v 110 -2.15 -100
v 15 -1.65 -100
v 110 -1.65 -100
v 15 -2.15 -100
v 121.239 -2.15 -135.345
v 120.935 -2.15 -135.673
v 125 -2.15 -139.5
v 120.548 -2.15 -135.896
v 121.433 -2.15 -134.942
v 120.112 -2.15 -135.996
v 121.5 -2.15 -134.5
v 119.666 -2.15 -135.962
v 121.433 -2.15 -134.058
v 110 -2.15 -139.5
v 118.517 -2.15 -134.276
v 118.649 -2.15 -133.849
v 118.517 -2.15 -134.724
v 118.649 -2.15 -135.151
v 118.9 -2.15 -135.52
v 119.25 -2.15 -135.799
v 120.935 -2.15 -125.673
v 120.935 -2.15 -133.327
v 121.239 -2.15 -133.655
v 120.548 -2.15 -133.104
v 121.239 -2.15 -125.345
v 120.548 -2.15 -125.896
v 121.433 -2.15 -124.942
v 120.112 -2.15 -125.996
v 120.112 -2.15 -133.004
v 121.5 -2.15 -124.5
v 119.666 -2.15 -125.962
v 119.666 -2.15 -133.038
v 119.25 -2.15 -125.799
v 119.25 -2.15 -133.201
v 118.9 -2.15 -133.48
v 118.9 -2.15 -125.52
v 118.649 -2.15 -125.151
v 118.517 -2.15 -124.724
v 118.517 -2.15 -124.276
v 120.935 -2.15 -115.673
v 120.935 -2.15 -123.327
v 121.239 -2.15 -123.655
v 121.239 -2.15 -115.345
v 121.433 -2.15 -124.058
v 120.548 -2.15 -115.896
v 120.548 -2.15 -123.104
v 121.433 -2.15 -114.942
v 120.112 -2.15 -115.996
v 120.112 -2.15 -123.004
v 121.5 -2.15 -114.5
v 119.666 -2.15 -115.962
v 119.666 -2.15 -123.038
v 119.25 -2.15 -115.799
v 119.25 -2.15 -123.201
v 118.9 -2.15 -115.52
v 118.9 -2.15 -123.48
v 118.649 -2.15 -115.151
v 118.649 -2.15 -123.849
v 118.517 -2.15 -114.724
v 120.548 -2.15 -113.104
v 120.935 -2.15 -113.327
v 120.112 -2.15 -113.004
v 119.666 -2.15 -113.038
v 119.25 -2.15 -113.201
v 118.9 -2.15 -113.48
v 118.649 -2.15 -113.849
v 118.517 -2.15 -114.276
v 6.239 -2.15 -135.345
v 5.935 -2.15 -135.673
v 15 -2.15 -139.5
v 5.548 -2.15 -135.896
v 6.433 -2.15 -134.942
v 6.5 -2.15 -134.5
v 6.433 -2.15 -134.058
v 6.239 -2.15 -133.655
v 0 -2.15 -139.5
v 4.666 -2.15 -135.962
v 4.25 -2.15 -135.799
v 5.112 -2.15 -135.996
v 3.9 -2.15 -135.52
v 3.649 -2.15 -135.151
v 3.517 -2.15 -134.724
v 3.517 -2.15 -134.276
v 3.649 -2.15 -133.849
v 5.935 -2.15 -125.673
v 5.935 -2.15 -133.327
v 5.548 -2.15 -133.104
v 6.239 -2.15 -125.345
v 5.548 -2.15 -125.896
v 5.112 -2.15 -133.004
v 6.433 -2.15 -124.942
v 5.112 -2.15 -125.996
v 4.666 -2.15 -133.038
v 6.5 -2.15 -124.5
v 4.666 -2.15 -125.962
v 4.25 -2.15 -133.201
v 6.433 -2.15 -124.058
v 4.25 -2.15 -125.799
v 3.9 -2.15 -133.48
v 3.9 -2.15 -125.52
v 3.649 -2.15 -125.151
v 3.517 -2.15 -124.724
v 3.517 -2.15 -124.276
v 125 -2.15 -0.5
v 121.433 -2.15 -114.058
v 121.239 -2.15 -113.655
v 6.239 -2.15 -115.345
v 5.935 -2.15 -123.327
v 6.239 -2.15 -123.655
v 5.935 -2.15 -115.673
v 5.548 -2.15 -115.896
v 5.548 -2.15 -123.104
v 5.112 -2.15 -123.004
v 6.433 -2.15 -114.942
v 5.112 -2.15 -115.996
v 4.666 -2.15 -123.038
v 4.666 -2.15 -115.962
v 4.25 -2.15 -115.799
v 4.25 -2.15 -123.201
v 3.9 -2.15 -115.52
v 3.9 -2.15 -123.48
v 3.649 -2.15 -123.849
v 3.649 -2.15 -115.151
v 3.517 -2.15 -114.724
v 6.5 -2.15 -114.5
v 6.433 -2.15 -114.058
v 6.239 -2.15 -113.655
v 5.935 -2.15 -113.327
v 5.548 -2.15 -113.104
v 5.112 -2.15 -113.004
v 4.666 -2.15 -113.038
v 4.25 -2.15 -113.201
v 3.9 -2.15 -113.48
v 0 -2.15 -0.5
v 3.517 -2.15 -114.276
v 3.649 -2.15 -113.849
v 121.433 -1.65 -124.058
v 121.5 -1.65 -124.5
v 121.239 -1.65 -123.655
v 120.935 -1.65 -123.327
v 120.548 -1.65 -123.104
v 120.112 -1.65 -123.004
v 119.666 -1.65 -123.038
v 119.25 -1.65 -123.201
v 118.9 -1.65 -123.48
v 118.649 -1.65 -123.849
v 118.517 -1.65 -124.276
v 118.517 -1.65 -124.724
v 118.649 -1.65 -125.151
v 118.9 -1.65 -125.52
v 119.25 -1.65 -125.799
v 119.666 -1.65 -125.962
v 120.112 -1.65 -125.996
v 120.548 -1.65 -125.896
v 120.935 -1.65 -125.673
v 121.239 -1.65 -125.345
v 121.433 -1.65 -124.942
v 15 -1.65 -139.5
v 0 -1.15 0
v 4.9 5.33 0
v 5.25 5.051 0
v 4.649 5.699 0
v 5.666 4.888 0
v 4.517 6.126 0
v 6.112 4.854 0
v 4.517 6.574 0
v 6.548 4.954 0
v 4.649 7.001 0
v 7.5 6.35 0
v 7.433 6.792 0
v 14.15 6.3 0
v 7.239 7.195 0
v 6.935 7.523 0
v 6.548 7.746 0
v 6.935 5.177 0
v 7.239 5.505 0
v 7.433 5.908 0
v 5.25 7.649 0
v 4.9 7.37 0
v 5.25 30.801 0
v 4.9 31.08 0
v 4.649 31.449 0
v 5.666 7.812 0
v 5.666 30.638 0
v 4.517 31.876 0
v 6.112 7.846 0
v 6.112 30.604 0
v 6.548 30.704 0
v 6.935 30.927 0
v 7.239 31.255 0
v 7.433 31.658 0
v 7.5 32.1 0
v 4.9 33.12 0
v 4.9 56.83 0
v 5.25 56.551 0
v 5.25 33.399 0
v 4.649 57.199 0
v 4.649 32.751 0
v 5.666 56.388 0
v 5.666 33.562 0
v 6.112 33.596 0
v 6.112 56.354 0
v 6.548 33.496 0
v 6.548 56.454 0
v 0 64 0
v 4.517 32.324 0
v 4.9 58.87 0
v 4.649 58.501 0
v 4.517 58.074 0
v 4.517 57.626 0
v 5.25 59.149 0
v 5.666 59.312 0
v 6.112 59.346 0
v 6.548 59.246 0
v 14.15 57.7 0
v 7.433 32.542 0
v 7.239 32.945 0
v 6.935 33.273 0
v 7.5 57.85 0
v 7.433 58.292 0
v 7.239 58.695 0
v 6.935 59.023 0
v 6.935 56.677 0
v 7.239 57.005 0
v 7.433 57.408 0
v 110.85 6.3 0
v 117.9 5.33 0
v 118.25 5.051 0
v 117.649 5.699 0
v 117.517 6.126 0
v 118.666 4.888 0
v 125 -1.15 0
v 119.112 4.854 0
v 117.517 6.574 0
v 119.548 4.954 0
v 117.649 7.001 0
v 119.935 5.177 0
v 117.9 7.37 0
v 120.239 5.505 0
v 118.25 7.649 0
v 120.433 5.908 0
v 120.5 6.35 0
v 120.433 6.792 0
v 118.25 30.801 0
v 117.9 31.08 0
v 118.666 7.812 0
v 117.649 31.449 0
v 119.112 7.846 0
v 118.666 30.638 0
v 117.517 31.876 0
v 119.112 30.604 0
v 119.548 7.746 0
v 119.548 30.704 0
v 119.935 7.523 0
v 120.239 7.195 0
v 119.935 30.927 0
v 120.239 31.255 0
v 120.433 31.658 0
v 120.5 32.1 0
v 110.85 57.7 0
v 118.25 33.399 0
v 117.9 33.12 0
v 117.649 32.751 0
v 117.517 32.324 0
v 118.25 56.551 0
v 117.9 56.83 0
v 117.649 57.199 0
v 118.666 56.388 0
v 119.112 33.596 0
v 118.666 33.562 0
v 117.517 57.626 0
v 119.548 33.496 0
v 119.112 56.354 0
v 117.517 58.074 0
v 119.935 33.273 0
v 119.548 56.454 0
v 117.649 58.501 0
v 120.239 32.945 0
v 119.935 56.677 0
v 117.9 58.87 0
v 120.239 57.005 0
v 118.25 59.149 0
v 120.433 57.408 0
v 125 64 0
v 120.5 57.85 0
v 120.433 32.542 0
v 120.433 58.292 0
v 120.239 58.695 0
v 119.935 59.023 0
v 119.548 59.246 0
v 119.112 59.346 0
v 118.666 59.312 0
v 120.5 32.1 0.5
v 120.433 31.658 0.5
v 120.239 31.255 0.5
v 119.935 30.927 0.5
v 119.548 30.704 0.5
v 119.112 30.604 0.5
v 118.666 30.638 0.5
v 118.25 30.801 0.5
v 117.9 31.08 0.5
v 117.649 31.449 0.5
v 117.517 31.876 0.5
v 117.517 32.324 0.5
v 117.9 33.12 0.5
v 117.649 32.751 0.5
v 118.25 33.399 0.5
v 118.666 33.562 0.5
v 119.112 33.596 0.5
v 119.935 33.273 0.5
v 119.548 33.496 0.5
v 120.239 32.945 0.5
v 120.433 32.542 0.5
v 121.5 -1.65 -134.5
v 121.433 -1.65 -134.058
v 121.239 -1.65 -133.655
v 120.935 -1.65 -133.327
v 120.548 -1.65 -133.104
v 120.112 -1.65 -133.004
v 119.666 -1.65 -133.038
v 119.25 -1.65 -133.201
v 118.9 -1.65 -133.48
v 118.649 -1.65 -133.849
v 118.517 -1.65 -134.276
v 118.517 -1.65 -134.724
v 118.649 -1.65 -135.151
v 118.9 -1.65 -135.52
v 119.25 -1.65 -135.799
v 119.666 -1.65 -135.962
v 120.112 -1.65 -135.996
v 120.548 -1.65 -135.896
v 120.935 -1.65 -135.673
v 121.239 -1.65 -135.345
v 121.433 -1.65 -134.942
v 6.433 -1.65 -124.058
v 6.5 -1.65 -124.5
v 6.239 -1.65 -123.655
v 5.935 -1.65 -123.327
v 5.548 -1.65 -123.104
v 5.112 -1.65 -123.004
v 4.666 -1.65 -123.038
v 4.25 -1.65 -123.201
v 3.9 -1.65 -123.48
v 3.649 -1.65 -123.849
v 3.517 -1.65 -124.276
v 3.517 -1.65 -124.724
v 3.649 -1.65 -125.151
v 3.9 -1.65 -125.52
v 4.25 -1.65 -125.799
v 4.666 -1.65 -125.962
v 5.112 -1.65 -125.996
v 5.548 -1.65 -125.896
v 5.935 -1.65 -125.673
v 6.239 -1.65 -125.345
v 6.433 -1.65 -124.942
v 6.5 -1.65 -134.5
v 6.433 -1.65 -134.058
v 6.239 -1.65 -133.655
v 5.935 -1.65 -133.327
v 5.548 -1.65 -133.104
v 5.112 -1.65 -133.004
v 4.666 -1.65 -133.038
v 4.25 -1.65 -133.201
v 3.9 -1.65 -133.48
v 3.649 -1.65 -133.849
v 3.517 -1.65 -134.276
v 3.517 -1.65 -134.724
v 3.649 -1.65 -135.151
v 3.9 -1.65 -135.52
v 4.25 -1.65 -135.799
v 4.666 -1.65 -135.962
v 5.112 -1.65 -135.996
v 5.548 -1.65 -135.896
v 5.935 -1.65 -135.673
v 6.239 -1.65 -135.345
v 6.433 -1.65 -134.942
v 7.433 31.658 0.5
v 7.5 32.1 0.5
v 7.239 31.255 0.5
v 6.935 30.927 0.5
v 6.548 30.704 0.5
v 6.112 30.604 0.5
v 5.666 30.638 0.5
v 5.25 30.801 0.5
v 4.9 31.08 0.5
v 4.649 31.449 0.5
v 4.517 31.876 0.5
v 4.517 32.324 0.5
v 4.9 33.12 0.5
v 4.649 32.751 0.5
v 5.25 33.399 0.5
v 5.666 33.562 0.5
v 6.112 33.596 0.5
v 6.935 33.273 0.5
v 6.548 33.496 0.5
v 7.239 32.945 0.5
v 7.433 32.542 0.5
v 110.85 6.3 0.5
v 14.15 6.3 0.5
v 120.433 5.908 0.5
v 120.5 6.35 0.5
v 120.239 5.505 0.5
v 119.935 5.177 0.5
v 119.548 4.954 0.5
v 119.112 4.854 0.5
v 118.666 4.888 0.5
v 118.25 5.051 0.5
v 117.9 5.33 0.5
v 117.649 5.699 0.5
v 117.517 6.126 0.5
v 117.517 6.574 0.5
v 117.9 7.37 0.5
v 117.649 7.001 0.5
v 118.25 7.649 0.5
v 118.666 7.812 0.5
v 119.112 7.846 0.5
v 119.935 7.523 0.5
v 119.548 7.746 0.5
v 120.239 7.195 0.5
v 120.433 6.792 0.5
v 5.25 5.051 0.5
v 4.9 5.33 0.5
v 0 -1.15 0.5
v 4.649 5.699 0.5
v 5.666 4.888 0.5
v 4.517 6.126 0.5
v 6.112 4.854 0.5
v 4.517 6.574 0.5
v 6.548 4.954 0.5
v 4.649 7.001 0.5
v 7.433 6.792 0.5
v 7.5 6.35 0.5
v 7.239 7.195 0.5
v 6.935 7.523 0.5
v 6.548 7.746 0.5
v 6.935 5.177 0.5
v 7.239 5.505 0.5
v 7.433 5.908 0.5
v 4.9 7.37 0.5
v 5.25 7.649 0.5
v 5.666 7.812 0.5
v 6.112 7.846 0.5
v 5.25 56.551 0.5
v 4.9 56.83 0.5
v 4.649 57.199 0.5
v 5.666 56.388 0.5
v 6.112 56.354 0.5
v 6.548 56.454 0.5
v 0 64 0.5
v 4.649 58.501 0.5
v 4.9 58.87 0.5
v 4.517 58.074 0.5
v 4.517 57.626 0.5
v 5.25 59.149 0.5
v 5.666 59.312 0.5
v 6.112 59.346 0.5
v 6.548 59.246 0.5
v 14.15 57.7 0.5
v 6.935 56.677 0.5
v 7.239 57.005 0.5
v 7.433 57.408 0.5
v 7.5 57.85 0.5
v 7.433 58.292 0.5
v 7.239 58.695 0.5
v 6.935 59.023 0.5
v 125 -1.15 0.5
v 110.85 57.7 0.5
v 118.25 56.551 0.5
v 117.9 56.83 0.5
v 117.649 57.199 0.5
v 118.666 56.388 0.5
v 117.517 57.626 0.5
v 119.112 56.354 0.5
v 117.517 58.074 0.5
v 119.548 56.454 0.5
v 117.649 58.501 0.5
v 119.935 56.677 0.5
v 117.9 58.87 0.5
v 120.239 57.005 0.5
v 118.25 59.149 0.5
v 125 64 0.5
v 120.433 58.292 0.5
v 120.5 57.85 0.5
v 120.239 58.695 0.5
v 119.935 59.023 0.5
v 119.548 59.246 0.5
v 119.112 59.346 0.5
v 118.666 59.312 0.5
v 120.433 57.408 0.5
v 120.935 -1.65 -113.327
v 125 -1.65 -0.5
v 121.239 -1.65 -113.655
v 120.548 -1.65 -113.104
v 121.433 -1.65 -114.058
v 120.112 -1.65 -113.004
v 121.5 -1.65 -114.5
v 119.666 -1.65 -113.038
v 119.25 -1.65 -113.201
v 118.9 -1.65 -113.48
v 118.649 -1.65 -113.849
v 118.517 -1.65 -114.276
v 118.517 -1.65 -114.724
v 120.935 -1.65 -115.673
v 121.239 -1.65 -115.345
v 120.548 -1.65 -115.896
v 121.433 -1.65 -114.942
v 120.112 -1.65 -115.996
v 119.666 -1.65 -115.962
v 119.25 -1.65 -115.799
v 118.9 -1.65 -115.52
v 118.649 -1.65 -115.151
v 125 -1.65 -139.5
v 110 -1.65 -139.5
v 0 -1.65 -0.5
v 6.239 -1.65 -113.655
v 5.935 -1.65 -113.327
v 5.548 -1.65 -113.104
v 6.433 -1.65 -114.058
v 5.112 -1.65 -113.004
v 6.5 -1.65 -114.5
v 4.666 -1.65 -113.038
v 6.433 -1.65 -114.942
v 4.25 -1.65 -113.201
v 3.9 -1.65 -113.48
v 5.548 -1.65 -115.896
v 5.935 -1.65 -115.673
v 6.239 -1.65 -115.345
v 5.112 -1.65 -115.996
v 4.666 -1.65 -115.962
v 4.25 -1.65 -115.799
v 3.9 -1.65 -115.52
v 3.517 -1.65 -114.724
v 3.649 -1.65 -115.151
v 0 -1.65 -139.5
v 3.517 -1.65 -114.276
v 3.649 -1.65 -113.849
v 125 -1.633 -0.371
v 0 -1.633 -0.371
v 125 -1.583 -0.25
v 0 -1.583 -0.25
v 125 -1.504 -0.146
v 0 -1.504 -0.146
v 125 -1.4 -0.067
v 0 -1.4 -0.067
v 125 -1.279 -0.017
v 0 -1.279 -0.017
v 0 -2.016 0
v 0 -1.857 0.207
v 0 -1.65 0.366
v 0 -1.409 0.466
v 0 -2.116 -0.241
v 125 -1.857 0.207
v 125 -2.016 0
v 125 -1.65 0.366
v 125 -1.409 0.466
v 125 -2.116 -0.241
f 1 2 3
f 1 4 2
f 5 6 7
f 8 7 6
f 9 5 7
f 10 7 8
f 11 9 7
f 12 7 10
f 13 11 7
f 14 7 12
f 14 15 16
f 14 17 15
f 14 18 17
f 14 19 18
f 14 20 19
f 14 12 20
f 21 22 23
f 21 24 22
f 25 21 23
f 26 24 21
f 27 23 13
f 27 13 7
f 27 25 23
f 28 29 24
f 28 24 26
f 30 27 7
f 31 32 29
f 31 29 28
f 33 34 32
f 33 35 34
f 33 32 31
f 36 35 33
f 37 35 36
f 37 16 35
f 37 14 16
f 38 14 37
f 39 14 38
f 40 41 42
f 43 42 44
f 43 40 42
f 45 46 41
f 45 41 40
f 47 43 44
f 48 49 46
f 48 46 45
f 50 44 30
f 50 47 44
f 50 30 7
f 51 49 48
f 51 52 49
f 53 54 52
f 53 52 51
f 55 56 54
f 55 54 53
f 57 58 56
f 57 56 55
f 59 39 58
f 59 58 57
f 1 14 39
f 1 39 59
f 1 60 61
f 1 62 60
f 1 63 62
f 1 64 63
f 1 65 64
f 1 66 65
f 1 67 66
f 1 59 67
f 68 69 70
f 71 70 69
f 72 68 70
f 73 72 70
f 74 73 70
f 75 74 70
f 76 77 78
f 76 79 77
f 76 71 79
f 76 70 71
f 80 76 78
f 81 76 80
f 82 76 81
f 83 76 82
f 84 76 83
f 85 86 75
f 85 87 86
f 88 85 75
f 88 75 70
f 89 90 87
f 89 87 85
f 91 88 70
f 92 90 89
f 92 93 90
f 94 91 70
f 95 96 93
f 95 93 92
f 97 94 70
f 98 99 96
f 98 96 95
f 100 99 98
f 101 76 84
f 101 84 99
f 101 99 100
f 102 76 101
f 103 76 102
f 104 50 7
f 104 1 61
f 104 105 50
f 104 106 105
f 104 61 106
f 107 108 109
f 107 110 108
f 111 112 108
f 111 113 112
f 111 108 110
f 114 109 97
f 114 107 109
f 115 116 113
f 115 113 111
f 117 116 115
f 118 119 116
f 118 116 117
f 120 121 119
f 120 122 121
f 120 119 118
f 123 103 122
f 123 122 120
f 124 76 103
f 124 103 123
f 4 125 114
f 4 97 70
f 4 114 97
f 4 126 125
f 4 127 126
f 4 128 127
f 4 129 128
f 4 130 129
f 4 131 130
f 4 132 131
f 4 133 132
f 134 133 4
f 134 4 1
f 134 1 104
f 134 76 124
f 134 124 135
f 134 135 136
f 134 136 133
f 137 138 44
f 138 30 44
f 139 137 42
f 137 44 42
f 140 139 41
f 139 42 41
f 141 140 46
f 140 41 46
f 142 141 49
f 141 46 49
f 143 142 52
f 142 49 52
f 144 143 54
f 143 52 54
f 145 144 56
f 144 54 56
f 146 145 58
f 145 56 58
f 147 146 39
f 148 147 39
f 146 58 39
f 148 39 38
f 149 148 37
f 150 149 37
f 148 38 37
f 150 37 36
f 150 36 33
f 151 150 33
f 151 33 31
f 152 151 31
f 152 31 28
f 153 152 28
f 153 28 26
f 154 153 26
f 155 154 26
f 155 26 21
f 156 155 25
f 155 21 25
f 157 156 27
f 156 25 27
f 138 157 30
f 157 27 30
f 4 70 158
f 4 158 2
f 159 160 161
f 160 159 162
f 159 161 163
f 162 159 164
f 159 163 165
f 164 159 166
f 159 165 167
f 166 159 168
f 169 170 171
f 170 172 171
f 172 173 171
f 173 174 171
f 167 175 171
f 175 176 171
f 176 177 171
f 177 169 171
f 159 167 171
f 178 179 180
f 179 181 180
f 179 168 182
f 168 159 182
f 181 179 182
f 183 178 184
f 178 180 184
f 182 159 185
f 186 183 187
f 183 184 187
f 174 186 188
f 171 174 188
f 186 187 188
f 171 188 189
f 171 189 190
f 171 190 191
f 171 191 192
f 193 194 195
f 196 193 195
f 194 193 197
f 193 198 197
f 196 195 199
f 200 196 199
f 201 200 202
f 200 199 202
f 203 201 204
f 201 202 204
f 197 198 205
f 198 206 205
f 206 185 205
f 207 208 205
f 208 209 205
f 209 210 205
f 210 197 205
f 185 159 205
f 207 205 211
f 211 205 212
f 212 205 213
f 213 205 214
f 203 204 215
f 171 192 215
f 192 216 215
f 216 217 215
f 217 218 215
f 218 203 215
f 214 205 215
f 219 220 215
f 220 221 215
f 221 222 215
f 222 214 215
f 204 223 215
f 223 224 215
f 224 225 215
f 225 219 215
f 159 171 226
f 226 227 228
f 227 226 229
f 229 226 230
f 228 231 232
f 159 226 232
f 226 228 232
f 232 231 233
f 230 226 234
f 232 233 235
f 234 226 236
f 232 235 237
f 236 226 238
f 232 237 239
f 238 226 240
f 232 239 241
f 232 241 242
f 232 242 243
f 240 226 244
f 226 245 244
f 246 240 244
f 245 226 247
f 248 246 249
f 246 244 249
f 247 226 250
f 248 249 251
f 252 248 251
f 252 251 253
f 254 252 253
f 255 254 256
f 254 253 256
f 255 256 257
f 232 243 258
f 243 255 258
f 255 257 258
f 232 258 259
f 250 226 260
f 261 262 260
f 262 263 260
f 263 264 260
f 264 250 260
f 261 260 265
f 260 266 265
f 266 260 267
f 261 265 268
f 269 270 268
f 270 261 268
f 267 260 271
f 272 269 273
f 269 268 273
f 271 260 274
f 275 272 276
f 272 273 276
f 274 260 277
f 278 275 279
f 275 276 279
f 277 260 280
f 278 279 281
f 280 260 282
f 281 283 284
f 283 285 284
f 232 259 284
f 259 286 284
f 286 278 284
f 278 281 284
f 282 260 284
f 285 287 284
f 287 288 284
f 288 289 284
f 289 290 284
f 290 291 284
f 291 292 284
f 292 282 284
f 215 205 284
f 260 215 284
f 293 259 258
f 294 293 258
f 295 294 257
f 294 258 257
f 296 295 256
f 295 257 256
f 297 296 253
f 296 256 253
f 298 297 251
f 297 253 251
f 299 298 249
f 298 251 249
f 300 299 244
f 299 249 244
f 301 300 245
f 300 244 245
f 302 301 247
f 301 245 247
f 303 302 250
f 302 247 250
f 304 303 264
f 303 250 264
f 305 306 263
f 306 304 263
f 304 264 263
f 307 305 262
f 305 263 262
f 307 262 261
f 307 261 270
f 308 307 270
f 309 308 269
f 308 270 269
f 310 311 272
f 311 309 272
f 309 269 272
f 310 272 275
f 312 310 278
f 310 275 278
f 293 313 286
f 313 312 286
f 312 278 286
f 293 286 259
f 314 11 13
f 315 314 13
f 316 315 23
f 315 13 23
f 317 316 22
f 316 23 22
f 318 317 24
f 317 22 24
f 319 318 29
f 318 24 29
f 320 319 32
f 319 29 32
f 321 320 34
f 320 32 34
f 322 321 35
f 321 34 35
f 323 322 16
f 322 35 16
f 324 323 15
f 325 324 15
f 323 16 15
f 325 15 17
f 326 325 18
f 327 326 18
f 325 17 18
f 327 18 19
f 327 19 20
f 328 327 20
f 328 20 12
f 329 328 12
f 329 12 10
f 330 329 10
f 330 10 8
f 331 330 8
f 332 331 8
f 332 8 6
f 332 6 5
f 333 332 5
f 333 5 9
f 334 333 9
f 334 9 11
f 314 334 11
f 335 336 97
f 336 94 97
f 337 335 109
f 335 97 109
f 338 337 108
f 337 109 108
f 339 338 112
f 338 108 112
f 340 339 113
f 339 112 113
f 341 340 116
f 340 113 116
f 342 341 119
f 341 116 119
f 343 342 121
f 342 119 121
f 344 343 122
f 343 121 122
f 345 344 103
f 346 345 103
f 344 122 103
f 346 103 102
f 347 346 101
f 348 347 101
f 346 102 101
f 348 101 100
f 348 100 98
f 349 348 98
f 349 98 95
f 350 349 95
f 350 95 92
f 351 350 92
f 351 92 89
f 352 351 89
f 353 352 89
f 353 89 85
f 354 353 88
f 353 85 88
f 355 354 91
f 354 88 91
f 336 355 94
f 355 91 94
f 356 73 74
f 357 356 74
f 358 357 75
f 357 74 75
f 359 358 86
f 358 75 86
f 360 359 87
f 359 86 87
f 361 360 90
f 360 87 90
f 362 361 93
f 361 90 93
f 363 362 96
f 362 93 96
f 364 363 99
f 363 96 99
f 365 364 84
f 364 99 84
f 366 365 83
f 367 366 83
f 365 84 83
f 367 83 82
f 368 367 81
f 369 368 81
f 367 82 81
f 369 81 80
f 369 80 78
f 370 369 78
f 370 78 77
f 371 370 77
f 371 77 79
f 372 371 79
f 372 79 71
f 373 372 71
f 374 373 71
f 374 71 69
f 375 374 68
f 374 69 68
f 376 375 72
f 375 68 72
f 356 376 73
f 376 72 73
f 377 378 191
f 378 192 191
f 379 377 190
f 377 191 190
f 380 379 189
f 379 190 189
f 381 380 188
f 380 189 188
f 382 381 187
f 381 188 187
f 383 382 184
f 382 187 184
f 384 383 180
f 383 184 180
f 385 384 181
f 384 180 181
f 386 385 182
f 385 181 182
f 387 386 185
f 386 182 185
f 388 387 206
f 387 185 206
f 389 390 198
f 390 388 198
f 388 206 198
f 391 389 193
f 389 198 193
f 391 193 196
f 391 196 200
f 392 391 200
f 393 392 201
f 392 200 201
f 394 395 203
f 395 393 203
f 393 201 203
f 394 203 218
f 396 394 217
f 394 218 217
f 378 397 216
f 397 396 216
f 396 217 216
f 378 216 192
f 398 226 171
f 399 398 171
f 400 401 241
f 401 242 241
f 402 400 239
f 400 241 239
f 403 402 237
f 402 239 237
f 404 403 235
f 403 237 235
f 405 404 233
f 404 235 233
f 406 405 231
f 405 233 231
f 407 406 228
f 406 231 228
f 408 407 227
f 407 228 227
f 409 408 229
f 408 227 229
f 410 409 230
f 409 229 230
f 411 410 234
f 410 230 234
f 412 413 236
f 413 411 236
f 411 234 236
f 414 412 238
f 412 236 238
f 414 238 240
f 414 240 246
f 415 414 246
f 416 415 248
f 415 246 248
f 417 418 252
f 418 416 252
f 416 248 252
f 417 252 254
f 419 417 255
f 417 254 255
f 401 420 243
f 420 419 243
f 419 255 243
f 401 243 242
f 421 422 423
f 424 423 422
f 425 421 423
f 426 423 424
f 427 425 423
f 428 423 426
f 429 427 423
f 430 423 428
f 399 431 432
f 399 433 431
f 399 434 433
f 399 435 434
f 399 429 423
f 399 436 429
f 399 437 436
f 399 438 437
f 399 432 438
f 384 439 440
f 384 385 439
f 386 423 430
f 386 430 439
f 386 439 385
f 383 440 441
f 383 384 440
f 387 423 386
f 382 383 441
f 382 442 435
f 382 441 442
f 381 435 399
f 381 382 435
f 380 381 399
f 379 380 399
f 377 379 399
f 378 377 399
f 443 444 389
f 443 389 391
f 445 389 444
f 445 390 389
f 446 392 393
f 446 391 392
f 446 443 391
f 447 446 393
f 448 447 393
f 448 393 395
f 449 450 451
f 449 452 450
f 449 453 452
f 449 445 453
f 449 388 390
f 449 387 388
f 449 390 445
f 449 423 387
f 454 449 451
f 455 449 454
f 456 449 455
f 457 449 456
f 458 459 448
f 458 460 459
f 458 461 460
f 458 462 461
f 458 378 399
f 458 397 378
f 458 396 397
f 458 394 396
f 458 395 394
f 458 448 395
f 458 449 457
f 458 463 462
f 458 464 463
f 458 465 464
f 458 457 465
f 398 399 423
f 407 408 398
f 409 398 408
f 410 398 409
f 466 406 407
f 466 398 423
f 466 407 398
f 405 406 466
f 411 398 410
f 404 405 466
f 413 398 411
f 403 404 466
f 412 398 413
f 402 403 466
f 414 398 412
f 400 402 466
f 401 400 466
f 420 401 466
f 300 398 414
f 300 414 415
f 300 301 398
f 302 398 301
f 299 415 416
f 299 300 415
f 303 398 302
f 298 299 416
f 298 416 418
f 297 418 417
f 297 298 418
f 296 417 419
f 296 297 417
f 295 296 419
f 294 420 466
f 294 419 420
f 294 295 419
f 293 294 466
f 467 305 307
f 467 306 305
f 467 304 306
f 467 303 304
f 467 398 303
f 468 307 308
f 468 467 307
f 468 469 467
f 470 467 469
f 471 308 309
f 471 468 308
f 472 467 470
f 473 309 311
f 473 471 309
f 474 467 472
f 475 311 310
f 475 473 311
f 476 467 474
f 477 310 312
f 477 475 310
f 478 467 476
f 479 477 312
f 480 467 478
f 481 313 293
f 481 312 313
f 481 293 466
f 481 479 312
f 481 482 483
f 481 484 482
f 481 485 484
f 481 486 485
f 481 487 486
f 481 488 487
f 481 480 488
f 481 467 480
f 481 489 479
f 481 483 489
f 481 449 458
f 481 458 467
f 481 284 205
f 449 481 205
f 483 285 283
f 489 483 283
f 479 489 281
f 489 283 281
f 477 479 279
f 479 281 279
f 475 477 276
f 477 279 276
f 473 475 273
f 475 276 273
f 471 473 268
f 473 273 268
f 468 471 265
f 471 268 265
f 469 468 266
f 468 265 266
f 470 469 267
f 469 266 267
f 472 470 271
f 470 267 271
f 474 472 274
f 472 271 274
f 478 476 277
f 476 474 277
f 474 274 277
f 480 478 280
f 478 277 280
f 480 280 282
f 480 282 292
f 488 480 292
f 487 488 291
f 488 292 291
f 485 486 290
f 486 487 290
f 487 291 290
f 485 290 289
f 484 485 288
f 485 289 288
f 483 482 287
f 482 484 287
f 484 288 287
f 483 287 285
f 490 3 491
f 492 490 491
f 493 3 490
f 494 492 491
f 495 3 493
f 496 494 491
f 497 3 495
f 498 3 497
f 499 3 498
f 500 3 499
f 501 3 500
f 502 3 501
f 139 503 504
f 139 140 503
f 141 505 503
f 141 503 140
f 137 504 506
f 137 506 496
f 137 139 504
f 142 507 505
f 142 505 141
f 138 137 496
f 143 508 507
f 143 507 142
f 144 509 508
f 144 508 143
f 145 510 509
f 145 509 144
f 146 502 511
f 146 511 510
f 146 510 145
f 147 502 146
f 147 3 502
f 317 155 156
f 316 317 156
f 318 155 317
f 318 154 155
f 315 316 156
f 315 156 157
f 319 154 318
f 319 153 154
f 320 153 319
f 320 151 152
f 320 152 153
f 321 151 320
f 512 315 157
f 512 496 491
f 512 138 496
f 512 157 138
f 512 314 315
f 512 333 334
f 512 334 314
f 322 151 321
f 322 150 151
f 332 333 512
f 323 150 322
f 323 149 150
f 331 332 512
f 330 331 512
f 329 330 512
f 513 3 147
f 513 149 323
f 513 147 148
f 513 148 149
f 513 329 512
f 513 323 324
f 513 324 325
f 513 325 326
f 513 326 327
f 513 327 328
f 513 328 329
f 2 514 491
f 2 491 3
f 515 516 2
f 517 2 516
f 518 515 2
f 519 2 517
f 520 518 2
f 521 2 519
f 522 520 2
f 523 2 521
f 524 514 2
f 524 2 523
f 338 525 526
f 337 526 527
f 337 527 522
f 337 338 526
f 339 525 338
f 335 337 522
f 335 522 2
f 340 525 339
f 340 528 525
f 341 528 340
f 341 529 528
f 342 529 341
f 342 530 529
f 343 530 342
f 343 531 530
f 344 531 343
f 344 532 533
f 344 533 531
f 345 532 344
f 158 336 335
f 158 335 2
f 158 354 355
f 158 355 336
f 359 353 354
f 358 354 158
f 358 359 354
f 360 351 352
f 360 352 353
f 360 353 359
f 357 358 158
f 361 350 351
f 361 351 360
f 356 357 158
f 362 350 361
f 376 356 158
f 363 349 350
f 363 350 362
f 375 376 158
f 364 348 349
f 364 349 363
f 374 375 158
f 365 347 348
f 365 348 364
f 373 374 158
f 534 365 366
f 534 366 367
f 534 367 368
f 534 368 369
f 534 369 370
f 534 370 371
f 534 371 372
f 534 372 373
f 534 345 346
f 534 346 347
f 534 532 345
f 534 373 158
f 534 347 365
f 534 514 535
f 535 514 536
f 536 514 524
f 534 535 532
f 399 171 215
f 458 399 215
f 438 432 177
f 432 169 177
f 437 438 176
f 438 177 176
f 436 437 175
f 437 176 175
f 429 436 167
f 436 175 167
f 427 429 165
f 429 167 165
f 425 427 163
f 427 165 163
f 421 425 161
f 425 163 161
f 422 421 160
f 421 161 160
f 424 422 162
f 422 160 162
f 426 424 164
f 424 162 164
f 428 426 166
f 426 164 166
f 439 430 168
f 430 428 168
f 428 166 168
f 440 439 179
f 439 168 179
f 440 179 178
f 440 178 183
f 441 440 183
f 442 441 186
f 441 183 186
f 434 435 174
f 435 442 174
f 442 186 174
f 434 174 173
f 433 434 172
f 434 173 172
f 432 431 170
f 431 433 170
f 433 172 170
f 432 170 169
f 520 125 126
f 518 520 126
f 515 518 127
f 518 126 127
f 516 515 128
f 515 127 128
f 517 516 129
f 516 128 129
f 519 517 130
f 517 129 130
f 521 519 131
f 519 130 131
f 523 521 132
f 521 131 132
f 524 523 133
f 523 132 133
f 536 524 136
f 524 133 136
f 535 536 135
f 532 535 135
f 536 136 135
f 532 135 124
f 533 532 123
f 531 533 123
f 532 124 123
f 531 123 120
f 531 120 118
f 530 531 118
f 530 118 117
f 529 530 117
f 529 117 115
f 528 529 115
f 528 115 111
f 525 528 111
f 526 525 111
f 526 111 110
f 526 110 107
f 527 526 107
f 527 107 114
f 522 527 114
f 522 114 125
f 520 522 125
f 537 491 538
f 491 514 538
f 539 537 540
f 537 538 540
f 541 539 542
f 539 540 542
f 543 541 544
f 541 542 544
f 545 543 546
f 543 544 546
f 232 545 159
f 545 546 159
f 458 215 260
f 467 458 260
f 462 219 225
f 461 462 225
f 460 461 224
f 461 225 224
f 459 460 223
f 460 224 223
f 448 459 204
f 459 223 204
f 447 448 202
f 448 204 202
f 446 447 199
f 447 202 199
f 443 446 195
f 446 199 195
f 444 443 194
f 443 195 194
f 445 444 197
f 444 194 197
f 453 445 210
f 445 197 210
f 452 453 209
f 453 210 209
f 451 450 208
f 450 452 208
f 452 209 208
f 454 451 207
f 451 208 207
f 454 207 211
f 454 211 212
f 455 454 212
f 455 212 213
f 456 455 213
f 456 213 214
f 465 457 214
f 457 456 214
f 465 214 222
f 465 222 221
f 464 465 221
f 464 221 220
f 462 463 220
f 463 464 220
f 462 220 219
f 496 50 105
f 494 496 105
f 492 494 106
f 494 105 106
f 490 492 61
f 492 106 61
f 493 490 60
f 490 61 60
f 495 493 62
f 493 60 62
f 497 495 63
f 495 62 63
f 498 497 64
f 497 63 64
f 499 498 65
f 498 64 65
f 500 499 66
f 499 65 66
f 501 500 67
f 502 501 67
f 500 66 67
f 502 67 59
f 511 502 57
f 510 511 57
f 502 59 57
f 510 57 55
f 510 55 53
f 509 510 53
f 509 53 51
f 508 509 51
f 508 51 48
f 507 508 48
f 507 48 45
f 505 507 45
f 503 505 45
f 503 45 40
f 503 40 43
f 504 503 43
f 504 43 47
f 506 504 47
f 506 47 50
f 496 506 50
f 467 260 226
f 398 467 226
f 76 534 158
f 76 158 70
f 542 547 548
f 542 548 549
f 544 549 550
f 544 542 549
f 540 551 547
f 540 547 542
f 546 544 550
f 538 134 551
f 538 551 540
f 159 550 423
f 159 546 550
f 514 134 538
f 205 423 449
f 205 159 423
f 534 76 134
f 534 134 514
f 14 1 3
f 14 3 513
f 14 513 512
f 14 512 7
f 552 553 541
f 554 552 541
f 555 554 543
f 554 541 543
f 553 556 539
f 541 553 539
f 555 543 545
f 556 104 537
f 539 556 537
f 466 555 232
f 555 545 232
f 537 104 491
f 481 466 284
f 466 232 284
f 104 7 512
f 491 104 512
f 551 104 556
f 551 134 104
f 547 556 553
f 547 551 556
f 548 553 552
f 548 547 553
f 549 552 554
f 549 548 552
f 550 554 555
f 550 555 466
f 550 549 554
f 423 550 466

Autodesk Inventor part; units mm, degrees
ref_plane "YZ Plane" through (0, 0, 0) normal (1, 0, 0) x (0, 1, 0)
ref_plane "XZ Plane" through (0, 0, 0) normal (0, 1, 0) x (-1, 0, 0)
ref_plane "XY Plane" through (0, 0, 0) normal (0, 0, 1) x (1, 0, 0)
sketch "Sketch1" plane through (0, 0, 0) normal (0, 0, 1) x (1, 0, 0)
  line L0 (0, 0) -> (125, 0)
  line L1 (125, 0) -> (125, 64)
  line L2 (125, 64) -> (0, 64)
  line L3 (0, 64) -> (0, 0)
  line L4 (0, 64) -> (14.15, 64) construction
  line L5 (14.15, 64) -> (14.15, 57.7) construction
  line L6 (14.15, 57.7) -> (110.85, 57.7)
  line L7 (110.85, 57.7) -> (110.85, 6.3)
  line L8 (110.85, 6.3) -> (14.15, 6.3)
  line L9 (14.15, 6.3) -> (14.15, 57.7)
  line L10 (0, 64) -> (0, 57.85) construction
  line L11 (0, 57.85) -> (6, 57.85) construction
  line L12 (6, 57.85) -> (6, 32.1) construction
  line L13 (6, 32.1) -> (6, 6.35) construction
  line L14 (6, 6.35) -> (119, 6.35) construction
  line L15 (119, 6.35) -> (119, 32.1) construction
  line L16 (119, 32.1) -> (119, 57.85) construction
  circle A0 centre (6, 57.85) radius 1.5
  circle A1 centre (6, 32.1) radius 1.5
  circle A2 centre (6, 6.35) radius 1.5
  circle A3 centre (119, 6.35) radius 1.5
  circle A4 centre (119, 57.85) radius 1.5
  circle A5 centre (119, 32.1) radius 1.5
  dimension "d0" = 125
  dimension "d1" = 64
  dimension "d2" = 14.15
  dimension "d3" = 6.3
  dimension "d4" = 96.7
  dimension "d5" = 51.4
  dimension "d6" = 6.15
  dimension "d7" = 6
  dimension "d8" = 25.75
  dimension "d9" = 25.75
  dimension "d10" = 113
  dimension "d11" = 3
  dimension "d12" = 3
  dimension "d13" = 3
  dimension "d14" = 3
  dimension "d16" = 3
  dimension "d18" = 3
extrude "Plate2" add sketch "Sketch1" along normal blind 0.5
sketch "Sketch2" plane through (0, 0, 0.5) normal (0, 0, 1) x (1, 0, 0)
  line L0 (0, 0) -> (125, 0)
  line L1 (125, 0) -> (125, -1)
  line L2 (125, -1) -> (0, -1)
  line L3 (0, -1) -> (0, 0)
  dimension "d20" = 125
  dimension "d21" = 1
sheet face with bend "Face3" sketch "Sketch2" thickness 0.5 toward (0, 0, -1) bend radius 0.5
bend "Bend1"
sketch "Sketch4" plane through (0, -1, 0.5) normal (0, -1, 0) x (1, 0, 0)
  line L0 (0, -0.5) -> (125, -0.5) projected
  line L1 (125, 0) -> (125, -0.5) projected
  line L2 (0, 0) -> (125, 0) projected
  line L3 (0, 0) -> (0, -0.5) projected
extrude "Extrusion1" add sketch "Sketch4" along normal blind 1.15
sketch "Sketch5" plane through (0, -1.65, 0.5) normal (0, -1, 0) x (1, 0, 0)
  line L0 (125, 0) -> (0, 0)
  line L1 (0, 0) -> (0, -140)
  line L2 (0, -140) -> (125, -140)
  line L3 (125, -140) -> (125, 0)
edge flange "Flange2" height 140 angle 90 thickness 0.5 bend radius 0.5 thickness toward (0, -1, 0) relief tear relief width 0.5 relief depth 0.25 edges at (62.5, -2.15, 0) wall of the first edge with corners at (125, -1.65, 0.5) (0, -1.65, 0.5) (0, -1.65, -139.5) (125, -1.65, -139.5)
bend "Bend3"
corner "Corner2"
sketch "Sketch6" plane through (0, -2.15, -139.5) normal (0, -1, 0) x (1, 0, 0)
  line L0 (0, 0) -> (0, 139) projected
  line L1 (125, 0) -> (0, 0) projected
  line L2 (125, 0) -> (120, 0) construction
  line L3 (120, 0) -> (120, 5) construction
  line L4 (120, 0) -> (110, 0) construction
  line L5 (110, 0) -> (110, 39.5) construction
  line L6 (110, 39.5) -> (15, 39.5) construction
  line L7 (15, 39.5) -> (110, 39.5)
  line L8 (110, 39.5) -> (110, 0)
  line L9 (110, 0) -> (15, 0)
  line L10 (15, 0) -> (15, 39.5)
  circle A0 centre (120, 5) radius 1.5
  line L11 (120, 5) -> (120, 15) construction
  line L12 (120, 15) -> (120, 25) construction
  circle A1 centre (120, 15) radius 1.5
  circle A2 centre (120, 25) radius 1.5
  line L13 (15, 0) -> (5, 0)
  circle A3 centre (5, 5) radius 1.5
  circle A4 centre (5, 15) radius 1.5
  circle A5 centre (5, 25) radius 1.5
  point P0 (0, 139.5)
  dimension "d49" = 5
  dimension "d50" = 5
  dimension "d51" = 10
  dimension "d52" = 39.5
  dimension "d53" = 95
  dimension "d54" = 3
  dimension "d55" = 10
  dimension "d56" = 10
  dimension "d57" = 3
  dimension "d58" = 3
  dimension "d59" = 10
  dimension "d60" = 3
  dimension "d61" = 3
  dimension "d62" = 3
extrude "Extrusion2" cut sketch "Sketch6" against normal blind 1.15
equation "\"d19\" = Thickness"
equation "\"d22\" = BendRadius"
equation "\"d23\" = BendReliefWidth"
equation "\"d25\" = MinimumRemnant"
equation "\"d24\" = BendReliefDepth"
equation "\"d26\" = TransitionRadius"
equation "\"d39\" = BendReliefWidth"
equation "\"d40\" = BendReliefDepth"
equation "\"d41\" = MinimumRemnant"
equation "\"d42\" = TransitionRadius"
equation "\"d45\" = BendRadius"
equation "\"d46\" = CornerReliefSize"
equation "\"d47\" = GapSize"
equation "\"d48\" = JacobiRadiusSize"
equation "\"BendRadius\" = Thickness"
equation "\"BendReliefWidth\" = Thickness"
equation "\"BendReliefDepth\" = 0.5 * Thickness"
equation "\"CornerReliefSize\" = 4 * Thickness"
equation "\"MinimumRemnant\" = 2 * Thickness"
equation "\"TransitionRadius\" = BendRadius"
equation "\"JacobiRadiusSize\" = BendRadius"
equation "\"GapSize\" = Thickness"
equation "\"Thickness\" = 0.5"
properties part number "psu mount"
